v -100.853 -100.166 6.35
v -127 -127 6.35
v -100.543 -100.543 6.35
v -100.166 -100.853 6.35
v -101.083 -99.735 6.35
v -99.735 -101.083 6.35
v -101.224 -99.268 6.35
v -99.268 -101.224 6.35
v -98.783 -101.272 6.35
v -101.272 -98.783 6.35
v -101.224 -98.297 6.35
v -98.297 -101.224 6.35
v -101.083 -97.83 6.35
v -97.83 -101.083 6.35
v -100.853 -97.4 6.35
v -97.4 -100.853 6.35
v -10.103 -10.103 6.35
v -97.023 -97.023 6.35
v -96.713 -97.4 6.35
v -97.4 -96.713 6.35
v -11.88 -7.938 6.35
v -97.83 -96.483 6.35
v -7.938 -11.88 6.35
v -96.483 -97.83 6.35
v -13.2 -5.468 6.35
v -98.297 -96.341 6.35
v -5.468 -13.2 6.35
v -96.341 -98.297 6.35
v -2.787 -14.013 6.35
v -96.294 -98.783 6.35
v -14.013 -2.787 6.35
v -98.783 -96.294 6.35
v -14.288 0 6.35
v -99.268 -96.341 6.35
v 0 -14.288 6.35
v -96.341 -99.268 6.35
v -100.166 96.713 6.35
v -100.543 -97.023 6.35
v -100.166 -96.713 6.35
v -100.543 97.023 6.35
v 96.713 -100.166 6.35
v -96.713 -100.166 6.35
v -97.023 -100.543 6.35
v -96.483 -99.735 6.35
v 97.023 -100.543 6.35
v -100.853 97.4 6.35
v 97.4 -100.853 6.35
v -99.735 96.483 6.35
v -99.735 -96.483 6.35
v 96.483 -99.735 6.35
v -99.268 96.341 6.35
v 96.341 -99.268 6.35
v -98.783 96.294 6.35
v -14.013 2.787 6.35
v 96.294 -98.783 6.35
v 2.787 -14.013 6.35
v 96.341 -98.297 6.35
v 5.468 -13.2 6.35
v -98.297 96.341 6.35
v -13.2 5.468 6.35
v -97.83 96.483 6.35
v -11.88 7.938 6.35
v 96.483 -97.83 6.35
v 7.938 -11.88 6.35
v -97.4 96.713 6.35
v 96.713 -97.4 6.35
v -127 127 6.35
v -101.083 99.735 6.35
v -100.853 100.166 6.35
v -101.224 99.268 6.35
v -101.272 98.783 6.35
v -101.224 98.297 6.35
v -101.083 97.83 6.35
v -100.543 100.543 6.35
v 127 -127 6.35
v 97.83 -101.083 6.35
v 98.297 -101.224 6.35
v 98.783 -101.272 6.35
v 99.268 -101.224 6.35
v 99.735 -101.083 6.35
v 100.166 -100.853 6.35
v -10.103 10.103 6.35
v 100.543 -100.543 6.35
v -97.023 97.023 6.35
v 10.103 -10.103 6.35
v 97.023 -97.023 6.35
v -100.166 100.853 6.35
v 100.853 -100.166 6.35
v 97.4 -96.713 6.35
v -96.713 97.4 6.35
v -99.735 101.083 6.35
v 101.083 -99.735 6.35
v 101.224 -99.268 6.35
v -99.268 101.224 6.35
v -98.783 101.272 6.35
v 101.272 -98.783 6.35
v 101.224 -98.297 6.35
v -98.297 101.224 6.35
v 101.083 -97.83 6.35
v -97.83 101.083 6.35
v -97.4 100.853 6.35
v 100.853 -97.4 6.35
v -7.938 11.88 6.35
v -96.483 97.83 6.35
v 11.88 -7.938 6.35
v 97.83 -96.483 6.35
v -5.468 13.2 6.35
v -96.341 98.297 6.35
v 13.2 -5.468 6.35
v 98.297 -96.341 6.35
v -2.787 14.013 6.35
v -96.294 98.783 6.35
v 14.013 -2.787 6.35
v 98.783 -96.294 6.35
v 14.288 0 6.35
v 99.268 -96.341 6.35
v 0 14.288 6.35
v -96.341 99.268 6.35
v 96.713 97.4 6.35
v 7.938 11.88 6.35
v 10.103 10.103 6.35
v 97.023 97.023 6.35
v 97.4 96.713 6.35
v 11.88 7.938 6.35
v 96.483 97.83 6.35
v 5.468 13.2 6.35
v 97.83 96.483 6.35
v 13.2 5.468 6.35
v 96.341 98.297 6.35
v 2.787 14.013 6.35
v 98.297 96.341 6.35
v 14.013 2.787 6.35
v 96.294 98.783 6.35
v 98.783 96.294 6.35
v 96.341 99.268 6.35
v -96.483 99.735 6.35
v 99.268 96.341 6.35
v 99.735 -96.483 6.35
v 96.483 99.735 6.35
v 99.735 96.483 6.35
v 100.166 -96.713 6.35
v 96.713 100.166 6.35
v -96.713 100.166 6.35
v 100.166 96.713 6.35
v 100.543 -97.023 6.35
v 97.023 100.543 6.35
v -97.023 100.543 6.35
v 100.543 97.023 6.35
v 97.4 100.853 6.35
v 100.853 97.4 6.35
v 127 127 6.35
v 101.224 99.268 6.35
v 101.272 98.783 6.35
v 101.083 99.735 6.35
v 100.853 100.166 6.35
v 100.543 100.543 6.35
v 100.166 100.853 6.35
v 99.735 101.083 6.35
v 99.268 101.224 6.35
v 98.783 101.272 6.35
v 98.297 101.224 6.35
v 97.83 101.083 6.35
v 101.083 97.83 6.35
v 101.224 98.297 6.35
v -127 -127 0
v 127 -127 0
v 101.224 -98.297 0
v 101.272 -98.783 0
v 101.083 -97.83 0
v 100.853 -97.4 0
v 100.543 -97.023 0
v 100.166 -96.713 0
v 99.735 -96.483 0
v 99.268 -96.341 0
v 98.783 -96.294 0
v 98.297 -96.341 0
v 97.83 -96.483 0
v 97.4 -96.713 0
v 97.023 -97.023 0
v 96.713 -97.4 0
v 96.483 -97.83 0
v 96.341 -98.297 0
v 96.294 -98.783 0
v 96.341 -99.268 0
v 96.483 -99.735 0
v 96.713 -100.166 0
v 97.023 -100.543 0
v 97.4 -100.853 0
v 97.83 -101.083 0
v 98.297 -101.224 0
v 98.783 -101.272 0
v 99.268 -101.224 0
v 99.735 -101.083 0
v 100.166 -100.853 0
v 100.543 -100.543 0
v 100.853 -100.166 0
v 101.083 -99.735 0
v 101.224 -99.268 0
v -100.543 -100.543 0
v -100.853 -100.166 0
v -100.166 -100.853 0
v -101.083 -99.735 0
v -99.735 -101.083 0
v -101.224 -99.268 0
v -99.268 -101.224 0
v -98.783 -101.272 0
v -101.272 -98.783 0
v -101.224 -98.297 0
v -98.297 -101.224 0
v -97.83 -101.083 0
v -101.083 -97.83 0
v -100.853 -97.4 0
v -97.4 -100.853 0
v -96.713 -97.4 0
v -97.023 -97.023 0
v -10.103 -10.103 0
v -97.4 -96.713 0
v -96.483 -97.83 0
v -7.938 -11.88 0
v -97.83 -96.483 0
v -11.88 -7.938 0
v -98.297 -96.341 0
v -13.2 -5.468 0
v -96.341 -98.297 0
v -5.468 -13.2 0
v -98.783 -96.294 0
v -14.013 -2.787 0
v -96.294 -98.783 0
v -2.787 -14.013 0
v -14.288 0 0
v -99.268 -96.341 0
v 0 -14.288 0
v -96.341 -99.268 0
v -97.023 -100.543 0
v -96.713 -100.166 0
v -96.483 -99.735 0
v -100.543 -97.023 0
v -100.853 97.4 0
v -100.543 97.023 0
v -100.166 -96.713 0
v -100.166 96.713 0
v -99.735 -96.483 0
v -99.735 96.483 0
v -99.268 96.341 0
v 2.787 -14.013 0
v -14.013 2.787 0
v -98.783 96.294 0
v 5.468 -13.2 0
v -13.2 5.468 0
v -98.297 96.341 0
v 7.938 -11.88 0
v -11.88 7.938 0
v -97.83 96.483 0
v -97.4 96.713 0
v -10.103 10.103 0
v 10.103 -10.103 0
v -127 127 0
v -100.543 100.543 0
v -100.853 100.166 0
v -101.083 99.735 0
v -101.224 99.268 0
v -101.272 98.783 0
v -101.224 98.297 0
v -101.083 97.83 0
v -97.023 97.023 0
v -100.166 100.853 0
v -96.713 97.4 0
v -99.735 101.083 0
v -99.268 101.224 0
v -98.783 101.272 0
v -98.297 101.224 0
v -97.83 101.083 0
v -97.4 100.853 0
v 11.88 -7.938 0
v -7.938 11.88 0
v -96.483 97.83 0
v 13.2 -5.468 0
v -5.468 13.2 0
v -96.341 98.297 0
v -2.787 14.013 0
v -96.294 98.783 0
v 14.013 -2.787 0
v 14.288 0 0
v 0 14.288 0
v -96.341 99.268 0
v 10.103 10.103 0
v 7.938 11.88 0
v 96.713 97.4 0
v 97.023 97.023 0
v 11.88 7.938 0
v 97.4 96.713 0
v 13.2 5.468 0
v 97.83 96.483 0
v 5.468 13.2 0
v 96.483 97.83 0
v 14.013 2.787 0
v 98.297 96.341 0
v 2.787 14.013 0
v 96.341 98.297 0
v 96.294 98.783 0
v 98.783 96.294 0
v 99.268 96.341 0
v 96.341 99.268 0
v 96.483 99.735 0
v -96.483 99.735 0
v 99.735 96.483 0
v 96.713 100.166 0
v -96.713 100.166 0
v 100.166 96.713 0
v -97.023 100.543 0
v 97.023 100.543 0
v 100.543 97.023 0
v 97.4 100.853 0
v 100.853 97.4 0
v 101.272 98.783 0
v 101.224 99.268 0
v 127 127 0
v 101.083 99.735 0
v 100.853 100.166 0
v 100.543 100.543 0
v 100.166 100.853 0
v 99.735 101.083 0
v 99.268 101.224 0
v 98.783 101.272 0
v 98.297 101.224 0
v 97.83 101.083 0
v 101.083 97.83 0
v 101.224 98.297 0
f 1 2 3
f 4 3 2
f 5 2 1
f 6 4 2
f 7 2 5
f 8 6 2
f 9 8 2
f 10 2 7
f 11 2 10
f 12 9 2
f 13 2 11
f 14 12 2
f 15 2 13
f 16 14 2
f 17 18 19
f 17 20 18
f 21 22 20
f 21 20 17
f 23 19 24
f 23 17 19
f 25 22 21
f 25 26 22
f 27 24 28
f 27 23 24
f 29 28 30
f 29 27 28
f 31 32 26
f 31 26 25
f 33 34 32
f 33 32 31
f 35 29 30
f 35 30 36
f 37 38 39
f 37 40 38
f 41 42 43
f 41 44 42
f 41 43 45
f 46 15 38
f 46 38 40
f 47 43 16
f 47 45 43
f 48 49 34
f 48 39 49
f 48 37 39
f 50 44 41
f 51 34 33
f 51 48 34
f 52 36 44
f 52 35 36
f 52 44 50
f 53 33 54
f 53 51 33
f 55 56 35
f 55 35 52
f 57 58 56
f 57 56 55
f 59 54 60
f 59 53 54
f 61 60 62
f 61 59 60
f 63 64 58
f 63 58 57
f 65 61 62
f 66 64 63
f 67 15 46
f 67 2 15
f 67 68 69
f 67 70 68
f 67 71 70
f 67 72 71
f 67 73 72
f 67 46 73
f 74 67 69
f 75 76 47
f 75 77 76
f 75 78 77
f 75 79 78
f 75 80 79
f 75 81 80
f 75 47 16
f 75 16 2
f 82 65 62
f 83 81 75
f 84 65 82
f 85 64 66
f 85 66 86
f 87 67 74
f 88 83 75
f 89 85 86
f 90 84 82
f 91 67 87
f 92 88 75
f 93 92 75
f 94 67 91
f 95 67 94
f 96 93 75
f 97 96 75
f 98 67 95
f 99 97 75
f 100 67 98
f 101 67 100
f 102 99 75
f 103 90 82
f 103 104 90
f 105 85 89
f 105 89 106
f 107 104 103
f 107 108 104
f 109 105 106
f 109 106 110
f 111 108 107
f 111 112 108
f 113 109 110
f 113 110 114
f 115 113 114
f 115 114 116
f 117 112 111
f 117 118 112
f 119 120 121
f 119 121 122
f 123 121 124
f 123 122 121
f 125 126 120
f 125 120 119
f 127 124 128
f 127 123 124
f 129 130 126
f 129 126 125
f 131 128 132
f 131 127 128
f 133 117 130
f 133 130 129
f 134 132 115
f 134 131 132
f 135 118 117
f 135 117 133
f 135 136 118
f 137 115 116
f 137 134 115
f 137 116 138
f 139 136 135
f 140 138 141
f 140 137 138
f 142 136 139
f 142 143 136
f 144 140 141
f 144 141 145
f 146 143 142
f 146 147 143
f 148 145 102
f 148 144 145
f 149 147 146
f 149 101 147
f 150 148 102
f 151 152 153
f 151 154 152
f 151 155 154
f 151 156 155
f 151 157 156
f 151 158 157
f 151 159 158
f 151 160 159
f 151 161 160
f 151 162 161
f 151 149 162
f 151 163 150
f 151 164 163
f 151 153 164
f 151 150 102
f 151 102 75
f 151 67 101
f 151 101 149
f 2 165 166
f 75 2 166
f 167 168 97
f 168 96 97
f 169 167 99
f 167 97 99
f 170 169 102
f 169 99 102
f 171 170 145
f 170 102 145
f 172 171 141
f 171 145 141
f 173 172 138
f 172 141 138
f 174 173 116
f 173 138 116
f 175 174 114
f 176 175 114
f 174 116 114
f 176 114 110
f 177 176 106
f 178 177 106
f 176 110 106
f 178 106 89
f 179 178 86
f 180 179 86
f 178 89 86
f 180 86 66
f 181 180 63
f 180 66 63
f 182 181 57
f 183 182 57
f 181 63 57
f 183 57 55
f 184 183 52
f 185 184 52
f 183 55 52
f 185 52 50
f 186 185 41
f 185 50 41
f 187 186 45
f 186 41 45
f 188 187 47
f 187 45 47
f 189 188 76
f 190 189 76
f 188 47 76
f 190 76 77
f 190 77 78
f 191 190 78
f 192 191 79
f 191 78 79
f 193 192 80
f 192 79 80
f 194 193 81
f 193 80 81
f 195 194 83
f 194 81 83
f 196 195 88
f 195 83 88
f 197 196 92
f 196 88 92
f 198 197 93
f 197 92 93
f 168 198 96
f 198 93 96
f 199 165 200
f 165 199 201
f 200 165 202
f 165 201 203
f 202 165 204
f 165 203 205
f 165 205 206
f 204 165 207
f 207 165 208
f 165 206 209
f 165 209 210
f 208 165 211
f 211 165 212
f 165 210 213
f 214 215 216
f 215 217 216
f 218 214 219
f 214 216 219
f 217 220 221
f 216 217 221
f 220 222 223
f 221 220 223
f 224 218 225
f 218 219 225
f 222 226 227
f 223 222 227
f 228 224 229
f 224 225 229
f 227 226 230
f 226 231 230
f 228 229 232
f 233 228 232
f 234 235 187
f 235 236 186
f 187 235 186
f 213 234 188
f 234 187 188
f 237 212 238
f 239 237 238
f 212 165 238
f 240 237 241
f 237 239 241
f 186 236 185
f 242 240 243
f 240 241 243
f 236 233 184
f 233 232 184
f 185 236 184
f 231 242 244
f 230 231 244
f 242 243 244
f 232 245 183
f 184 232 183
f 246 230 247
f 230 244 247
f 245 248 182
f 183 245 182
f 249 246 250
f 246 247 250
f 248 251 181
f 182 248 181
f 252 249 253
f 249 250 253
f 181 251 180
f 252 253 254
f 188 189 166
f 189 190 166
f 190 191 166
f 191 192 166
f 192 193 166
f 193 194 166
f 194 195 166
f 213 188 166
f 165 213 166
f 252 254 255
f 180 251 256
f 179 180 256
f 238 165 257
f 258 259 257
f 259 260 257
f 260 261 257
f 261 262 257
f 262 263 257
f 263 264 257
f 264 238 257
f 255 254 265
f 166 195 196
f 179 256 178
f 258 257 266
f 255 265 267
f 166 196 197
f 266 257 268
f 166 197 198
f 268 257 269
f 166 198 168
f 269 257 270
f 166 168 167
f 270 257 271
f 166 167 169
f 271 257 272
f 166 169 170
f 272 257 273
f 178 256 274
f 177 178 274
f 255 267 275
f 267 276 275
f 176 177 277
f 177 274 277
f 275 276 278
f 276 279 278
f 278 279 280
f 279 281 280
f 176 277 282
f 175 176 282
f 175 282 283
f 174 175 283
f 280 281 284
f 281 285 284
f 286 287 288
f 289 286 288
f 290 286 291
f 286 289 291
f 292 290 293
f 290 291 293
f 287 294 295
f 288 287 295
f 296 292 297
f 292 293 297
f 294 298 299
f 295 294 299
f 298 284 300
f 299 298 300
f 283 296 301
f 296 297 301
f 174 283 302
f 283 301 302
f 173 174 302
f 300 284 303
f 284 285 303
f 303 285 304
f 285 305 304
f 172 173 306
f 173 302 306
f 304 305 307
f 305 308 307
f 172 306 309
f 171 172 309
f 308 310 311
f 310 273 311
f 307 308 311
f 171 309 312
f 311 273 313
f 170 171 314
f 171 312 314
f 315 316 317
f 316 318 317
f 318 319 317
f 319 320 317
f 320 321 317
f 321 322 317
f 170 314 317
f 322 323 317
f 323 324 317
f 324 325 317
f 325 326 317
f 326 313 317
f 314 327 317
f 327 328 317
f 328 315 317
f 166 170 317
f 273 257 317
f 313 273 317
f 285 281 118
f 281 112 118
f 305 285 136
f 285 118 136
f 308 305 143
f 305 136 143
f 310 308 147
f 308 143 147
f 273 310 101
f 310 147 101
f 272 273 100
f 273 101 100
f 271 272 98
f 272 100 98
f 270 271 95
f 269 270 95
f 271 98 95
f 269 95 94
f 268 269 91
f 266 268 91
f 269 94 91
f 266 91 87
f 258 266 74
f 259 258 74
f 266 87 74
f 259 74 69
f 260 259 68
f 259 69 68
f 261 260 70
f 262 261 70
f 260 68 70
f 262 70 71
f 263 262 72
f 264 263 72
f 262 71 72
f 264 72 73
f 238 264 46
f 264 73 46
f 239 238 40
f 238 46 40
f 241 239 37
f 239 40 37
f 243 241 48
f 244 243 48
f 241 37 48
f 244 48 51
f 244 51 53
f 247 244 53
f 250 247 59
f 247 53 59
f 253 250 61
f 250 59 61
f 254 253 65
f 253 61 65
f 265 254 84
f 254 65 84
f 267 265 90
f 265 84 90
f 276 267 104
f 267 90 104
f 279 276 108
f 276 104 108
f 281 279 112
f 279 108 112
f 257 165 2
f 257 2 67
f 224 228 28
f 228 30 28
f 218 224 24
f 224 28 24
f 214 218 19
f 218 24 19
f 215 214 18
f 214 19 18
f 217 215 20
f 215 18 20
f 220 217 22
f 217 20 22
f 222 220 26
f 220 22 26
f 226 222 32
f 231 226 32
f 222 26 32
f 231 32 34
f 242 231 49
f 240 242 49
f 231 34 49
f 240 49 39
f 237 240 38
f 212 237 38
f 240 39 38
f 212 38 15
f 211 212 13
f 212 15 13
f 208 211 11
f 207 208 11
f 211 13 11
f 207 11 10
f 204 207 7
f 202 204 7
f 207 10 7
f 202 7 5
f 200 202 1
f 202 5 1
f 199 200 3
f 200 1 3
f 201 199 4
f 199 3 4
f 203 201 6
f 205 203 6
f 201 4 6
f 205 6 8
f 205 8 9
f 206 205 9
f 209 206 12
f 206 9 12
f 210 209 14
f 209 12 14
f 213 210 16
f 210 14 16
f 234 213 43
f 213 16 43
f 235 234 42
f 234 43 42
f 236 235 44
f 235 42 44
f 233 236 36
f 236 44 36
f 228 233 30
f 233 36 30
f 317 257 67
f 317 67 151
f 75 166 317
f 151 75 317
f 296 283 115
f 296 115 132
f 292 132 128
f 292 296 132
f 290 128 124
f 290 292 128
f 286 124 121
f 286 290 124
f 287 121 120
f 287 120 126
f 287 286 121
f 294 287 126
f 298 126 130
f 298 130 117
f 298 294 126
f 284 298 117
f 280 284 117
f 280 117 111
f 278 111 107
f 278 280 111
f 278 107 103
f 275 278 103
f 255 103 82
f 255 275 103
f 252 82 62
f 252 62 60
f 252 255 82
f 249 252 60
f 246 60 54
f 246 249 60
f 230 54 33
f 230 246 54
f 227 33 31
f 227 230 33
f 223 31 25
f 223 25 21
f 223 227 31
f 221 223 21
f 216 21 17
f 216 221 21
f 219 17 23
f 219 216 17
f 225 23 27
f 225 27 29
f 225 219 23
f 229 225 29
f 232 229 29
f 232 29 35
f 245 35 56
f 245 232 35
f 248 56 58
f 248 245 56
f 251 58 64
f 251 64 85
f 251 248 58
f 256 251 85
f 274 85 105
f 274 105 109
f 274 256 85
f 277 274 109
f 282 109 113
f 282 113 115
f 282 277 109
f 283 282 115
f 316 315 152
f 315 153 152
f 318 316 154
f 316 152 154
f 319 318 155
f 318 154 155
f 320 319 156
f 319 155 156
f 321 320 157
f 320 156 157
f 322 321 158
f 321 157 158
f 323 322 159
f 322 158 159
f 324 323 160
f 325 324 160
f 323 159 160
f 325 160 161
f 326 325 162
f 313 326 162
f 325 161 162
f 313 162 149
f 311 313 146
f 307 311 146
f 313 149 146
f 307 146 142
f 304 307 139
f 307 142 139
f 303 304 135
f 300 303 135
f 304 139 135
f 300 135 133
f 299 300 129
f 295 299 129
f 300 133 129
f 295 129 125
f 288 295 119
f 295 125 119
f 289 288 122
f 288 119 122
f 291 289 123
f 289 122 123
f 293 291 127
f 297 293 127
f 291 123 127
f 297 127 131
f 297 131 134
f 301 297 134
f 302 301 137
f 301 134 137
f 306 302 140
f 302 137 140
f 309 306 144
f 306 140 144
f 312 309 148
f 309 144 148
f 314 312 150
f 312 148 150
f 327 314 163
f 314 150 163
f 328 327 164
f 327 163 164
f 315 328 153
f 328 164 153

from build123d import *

# Parameters (mm, degrees)
SKETCH1_W                      = 254
SKETCH1_H                      = 254
SKETCH1_R                      = 10.16
SKETCH1_R_2                    = 14.2875
BOSS_EXTRUDE2_DEPTH            = 6.35
F_9_0_196_DIAMETER_HOLE1_D     = 4.9784
F_9_0_196_DIAMETER_HOLE1_DEPTH = 6.35
F_9_0_196_DIAMETER_HOLE1_TIP   = 1.495662253


with BuildPart() as part:
    # Sketch1 → Boss-Extrude2 (new body)
    # profile 1 of 4: a face of its own
    with BuildSketch(Plane.XY):
        Rectangle(SKETCH1_W, SKETCH1_H)
        with Locations((-41.221968309, 29.688201844)):
            Circle(SKETCH1_R, mode=Mode.SUBTRACT)
        with Locations((0, 49.5808)):
            Circle(SKETCH1_R_2, mode=Mode.SUBTRACT)
        Circle(SKETCH1_R_2, mode=Mode.SUBTRACT)
        with Locations((41.221968309, 29.688201844)):
            Circle(SKETCH1_R, mode=Mode.SUBTRACT)
    # profile 2 of 4: a face of its own
    with BuildSketch(Plane.XY):
        with Locations((0, 49.5808)):
            Circle(SKETCH1_R_2)
    # profile 3 of 4: a face of its own
    with BuildSketch(Plane.XY):
        with Locations((41.221968309, 29.688201844)):
            Circle(SKETCH1_R)
    # profile 4 of 4: a face of its own
    with BuildSketch(Plane.XY):
        with Locations((-41.221968309, 29.688201844)):
            Circle(SKETCH1_R)
    extrude(amount=BOSS_EXTRUDE2_DEPTH)

    # #9 (0.196) Diameter Hole1
    with Locations(Plane(origin=(0, 0, 0), x_dir=(-1, 0, 0), z_dir=(0, 0, -1))):
        with Locations((-98.782817332, 98.782817332), (98.782817332, 98.782817332), (98.782817332, -98.782817332), (-98.782817332, -98.782817332)):
            Hole(F_9_0_196_DIAMETER_HOLE1_D / 2, depth=F_9_0_196_DIAMETER_HOLE1_DEPTH)
            with Locations((0, 0, -(F_9_0_196_DIAMETER_HOLE1_DEPTH + F_9_0_196_DIAMETER_HOLE1_TIP / 2))):  # 118° drill point
                Cone(0, F_9_0_196_DIAMETER_HOLE1_D / 2, F_9_0_196_DIAMETER_HOLE1_TIP, mode=Mode.SUBTRACT)


solid = part.part
